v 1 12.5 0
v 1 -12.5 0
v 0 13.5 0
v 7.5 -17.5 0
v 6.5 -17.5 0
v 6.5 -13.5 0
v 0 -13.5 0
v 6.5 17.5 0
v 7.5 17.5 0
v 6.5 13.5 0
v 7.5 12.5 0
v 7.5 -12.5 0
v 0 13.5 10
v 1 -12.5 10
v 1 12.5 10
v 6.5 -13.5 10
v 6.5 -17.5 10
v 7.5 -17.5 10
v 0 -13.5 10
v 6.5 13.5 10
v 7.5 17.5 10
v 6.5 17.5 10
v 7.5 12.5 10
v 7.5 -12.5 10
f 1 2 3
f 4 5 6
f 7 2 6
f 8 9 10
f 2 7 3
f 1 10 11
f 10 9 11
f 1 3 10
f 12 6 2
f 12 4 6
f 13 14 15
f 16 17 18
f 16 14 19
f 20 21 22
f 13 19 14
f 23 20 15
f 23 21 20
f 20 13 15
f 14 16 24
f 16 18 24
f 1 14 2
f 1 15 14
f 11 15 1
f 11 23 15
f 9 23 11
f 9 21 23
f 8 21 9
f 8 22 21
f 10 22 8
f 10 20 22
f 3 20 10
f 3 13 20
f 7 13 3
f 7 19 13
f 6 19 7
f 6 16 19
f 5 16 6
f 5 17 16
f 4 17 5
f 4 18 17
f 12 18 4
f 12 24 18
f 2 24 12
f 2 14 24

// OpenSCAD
length = 10;

//t([-7.5,0,0])
linear_extrude(length) dinRail();

module dinRail(){
	t([0,-27/2]) square([1,27]);
	
	t([0,-27/2]) square([7.5,1]);
	t([0,27/2-1]) square([7.5,1]);
	
	t([7.5-1,-27/2-5+1]) square([1,5]);
	t([7.5-1,27/2-1]) square([1,5]);
}

module t(v=[0,0,0]){translate(v) children();}
